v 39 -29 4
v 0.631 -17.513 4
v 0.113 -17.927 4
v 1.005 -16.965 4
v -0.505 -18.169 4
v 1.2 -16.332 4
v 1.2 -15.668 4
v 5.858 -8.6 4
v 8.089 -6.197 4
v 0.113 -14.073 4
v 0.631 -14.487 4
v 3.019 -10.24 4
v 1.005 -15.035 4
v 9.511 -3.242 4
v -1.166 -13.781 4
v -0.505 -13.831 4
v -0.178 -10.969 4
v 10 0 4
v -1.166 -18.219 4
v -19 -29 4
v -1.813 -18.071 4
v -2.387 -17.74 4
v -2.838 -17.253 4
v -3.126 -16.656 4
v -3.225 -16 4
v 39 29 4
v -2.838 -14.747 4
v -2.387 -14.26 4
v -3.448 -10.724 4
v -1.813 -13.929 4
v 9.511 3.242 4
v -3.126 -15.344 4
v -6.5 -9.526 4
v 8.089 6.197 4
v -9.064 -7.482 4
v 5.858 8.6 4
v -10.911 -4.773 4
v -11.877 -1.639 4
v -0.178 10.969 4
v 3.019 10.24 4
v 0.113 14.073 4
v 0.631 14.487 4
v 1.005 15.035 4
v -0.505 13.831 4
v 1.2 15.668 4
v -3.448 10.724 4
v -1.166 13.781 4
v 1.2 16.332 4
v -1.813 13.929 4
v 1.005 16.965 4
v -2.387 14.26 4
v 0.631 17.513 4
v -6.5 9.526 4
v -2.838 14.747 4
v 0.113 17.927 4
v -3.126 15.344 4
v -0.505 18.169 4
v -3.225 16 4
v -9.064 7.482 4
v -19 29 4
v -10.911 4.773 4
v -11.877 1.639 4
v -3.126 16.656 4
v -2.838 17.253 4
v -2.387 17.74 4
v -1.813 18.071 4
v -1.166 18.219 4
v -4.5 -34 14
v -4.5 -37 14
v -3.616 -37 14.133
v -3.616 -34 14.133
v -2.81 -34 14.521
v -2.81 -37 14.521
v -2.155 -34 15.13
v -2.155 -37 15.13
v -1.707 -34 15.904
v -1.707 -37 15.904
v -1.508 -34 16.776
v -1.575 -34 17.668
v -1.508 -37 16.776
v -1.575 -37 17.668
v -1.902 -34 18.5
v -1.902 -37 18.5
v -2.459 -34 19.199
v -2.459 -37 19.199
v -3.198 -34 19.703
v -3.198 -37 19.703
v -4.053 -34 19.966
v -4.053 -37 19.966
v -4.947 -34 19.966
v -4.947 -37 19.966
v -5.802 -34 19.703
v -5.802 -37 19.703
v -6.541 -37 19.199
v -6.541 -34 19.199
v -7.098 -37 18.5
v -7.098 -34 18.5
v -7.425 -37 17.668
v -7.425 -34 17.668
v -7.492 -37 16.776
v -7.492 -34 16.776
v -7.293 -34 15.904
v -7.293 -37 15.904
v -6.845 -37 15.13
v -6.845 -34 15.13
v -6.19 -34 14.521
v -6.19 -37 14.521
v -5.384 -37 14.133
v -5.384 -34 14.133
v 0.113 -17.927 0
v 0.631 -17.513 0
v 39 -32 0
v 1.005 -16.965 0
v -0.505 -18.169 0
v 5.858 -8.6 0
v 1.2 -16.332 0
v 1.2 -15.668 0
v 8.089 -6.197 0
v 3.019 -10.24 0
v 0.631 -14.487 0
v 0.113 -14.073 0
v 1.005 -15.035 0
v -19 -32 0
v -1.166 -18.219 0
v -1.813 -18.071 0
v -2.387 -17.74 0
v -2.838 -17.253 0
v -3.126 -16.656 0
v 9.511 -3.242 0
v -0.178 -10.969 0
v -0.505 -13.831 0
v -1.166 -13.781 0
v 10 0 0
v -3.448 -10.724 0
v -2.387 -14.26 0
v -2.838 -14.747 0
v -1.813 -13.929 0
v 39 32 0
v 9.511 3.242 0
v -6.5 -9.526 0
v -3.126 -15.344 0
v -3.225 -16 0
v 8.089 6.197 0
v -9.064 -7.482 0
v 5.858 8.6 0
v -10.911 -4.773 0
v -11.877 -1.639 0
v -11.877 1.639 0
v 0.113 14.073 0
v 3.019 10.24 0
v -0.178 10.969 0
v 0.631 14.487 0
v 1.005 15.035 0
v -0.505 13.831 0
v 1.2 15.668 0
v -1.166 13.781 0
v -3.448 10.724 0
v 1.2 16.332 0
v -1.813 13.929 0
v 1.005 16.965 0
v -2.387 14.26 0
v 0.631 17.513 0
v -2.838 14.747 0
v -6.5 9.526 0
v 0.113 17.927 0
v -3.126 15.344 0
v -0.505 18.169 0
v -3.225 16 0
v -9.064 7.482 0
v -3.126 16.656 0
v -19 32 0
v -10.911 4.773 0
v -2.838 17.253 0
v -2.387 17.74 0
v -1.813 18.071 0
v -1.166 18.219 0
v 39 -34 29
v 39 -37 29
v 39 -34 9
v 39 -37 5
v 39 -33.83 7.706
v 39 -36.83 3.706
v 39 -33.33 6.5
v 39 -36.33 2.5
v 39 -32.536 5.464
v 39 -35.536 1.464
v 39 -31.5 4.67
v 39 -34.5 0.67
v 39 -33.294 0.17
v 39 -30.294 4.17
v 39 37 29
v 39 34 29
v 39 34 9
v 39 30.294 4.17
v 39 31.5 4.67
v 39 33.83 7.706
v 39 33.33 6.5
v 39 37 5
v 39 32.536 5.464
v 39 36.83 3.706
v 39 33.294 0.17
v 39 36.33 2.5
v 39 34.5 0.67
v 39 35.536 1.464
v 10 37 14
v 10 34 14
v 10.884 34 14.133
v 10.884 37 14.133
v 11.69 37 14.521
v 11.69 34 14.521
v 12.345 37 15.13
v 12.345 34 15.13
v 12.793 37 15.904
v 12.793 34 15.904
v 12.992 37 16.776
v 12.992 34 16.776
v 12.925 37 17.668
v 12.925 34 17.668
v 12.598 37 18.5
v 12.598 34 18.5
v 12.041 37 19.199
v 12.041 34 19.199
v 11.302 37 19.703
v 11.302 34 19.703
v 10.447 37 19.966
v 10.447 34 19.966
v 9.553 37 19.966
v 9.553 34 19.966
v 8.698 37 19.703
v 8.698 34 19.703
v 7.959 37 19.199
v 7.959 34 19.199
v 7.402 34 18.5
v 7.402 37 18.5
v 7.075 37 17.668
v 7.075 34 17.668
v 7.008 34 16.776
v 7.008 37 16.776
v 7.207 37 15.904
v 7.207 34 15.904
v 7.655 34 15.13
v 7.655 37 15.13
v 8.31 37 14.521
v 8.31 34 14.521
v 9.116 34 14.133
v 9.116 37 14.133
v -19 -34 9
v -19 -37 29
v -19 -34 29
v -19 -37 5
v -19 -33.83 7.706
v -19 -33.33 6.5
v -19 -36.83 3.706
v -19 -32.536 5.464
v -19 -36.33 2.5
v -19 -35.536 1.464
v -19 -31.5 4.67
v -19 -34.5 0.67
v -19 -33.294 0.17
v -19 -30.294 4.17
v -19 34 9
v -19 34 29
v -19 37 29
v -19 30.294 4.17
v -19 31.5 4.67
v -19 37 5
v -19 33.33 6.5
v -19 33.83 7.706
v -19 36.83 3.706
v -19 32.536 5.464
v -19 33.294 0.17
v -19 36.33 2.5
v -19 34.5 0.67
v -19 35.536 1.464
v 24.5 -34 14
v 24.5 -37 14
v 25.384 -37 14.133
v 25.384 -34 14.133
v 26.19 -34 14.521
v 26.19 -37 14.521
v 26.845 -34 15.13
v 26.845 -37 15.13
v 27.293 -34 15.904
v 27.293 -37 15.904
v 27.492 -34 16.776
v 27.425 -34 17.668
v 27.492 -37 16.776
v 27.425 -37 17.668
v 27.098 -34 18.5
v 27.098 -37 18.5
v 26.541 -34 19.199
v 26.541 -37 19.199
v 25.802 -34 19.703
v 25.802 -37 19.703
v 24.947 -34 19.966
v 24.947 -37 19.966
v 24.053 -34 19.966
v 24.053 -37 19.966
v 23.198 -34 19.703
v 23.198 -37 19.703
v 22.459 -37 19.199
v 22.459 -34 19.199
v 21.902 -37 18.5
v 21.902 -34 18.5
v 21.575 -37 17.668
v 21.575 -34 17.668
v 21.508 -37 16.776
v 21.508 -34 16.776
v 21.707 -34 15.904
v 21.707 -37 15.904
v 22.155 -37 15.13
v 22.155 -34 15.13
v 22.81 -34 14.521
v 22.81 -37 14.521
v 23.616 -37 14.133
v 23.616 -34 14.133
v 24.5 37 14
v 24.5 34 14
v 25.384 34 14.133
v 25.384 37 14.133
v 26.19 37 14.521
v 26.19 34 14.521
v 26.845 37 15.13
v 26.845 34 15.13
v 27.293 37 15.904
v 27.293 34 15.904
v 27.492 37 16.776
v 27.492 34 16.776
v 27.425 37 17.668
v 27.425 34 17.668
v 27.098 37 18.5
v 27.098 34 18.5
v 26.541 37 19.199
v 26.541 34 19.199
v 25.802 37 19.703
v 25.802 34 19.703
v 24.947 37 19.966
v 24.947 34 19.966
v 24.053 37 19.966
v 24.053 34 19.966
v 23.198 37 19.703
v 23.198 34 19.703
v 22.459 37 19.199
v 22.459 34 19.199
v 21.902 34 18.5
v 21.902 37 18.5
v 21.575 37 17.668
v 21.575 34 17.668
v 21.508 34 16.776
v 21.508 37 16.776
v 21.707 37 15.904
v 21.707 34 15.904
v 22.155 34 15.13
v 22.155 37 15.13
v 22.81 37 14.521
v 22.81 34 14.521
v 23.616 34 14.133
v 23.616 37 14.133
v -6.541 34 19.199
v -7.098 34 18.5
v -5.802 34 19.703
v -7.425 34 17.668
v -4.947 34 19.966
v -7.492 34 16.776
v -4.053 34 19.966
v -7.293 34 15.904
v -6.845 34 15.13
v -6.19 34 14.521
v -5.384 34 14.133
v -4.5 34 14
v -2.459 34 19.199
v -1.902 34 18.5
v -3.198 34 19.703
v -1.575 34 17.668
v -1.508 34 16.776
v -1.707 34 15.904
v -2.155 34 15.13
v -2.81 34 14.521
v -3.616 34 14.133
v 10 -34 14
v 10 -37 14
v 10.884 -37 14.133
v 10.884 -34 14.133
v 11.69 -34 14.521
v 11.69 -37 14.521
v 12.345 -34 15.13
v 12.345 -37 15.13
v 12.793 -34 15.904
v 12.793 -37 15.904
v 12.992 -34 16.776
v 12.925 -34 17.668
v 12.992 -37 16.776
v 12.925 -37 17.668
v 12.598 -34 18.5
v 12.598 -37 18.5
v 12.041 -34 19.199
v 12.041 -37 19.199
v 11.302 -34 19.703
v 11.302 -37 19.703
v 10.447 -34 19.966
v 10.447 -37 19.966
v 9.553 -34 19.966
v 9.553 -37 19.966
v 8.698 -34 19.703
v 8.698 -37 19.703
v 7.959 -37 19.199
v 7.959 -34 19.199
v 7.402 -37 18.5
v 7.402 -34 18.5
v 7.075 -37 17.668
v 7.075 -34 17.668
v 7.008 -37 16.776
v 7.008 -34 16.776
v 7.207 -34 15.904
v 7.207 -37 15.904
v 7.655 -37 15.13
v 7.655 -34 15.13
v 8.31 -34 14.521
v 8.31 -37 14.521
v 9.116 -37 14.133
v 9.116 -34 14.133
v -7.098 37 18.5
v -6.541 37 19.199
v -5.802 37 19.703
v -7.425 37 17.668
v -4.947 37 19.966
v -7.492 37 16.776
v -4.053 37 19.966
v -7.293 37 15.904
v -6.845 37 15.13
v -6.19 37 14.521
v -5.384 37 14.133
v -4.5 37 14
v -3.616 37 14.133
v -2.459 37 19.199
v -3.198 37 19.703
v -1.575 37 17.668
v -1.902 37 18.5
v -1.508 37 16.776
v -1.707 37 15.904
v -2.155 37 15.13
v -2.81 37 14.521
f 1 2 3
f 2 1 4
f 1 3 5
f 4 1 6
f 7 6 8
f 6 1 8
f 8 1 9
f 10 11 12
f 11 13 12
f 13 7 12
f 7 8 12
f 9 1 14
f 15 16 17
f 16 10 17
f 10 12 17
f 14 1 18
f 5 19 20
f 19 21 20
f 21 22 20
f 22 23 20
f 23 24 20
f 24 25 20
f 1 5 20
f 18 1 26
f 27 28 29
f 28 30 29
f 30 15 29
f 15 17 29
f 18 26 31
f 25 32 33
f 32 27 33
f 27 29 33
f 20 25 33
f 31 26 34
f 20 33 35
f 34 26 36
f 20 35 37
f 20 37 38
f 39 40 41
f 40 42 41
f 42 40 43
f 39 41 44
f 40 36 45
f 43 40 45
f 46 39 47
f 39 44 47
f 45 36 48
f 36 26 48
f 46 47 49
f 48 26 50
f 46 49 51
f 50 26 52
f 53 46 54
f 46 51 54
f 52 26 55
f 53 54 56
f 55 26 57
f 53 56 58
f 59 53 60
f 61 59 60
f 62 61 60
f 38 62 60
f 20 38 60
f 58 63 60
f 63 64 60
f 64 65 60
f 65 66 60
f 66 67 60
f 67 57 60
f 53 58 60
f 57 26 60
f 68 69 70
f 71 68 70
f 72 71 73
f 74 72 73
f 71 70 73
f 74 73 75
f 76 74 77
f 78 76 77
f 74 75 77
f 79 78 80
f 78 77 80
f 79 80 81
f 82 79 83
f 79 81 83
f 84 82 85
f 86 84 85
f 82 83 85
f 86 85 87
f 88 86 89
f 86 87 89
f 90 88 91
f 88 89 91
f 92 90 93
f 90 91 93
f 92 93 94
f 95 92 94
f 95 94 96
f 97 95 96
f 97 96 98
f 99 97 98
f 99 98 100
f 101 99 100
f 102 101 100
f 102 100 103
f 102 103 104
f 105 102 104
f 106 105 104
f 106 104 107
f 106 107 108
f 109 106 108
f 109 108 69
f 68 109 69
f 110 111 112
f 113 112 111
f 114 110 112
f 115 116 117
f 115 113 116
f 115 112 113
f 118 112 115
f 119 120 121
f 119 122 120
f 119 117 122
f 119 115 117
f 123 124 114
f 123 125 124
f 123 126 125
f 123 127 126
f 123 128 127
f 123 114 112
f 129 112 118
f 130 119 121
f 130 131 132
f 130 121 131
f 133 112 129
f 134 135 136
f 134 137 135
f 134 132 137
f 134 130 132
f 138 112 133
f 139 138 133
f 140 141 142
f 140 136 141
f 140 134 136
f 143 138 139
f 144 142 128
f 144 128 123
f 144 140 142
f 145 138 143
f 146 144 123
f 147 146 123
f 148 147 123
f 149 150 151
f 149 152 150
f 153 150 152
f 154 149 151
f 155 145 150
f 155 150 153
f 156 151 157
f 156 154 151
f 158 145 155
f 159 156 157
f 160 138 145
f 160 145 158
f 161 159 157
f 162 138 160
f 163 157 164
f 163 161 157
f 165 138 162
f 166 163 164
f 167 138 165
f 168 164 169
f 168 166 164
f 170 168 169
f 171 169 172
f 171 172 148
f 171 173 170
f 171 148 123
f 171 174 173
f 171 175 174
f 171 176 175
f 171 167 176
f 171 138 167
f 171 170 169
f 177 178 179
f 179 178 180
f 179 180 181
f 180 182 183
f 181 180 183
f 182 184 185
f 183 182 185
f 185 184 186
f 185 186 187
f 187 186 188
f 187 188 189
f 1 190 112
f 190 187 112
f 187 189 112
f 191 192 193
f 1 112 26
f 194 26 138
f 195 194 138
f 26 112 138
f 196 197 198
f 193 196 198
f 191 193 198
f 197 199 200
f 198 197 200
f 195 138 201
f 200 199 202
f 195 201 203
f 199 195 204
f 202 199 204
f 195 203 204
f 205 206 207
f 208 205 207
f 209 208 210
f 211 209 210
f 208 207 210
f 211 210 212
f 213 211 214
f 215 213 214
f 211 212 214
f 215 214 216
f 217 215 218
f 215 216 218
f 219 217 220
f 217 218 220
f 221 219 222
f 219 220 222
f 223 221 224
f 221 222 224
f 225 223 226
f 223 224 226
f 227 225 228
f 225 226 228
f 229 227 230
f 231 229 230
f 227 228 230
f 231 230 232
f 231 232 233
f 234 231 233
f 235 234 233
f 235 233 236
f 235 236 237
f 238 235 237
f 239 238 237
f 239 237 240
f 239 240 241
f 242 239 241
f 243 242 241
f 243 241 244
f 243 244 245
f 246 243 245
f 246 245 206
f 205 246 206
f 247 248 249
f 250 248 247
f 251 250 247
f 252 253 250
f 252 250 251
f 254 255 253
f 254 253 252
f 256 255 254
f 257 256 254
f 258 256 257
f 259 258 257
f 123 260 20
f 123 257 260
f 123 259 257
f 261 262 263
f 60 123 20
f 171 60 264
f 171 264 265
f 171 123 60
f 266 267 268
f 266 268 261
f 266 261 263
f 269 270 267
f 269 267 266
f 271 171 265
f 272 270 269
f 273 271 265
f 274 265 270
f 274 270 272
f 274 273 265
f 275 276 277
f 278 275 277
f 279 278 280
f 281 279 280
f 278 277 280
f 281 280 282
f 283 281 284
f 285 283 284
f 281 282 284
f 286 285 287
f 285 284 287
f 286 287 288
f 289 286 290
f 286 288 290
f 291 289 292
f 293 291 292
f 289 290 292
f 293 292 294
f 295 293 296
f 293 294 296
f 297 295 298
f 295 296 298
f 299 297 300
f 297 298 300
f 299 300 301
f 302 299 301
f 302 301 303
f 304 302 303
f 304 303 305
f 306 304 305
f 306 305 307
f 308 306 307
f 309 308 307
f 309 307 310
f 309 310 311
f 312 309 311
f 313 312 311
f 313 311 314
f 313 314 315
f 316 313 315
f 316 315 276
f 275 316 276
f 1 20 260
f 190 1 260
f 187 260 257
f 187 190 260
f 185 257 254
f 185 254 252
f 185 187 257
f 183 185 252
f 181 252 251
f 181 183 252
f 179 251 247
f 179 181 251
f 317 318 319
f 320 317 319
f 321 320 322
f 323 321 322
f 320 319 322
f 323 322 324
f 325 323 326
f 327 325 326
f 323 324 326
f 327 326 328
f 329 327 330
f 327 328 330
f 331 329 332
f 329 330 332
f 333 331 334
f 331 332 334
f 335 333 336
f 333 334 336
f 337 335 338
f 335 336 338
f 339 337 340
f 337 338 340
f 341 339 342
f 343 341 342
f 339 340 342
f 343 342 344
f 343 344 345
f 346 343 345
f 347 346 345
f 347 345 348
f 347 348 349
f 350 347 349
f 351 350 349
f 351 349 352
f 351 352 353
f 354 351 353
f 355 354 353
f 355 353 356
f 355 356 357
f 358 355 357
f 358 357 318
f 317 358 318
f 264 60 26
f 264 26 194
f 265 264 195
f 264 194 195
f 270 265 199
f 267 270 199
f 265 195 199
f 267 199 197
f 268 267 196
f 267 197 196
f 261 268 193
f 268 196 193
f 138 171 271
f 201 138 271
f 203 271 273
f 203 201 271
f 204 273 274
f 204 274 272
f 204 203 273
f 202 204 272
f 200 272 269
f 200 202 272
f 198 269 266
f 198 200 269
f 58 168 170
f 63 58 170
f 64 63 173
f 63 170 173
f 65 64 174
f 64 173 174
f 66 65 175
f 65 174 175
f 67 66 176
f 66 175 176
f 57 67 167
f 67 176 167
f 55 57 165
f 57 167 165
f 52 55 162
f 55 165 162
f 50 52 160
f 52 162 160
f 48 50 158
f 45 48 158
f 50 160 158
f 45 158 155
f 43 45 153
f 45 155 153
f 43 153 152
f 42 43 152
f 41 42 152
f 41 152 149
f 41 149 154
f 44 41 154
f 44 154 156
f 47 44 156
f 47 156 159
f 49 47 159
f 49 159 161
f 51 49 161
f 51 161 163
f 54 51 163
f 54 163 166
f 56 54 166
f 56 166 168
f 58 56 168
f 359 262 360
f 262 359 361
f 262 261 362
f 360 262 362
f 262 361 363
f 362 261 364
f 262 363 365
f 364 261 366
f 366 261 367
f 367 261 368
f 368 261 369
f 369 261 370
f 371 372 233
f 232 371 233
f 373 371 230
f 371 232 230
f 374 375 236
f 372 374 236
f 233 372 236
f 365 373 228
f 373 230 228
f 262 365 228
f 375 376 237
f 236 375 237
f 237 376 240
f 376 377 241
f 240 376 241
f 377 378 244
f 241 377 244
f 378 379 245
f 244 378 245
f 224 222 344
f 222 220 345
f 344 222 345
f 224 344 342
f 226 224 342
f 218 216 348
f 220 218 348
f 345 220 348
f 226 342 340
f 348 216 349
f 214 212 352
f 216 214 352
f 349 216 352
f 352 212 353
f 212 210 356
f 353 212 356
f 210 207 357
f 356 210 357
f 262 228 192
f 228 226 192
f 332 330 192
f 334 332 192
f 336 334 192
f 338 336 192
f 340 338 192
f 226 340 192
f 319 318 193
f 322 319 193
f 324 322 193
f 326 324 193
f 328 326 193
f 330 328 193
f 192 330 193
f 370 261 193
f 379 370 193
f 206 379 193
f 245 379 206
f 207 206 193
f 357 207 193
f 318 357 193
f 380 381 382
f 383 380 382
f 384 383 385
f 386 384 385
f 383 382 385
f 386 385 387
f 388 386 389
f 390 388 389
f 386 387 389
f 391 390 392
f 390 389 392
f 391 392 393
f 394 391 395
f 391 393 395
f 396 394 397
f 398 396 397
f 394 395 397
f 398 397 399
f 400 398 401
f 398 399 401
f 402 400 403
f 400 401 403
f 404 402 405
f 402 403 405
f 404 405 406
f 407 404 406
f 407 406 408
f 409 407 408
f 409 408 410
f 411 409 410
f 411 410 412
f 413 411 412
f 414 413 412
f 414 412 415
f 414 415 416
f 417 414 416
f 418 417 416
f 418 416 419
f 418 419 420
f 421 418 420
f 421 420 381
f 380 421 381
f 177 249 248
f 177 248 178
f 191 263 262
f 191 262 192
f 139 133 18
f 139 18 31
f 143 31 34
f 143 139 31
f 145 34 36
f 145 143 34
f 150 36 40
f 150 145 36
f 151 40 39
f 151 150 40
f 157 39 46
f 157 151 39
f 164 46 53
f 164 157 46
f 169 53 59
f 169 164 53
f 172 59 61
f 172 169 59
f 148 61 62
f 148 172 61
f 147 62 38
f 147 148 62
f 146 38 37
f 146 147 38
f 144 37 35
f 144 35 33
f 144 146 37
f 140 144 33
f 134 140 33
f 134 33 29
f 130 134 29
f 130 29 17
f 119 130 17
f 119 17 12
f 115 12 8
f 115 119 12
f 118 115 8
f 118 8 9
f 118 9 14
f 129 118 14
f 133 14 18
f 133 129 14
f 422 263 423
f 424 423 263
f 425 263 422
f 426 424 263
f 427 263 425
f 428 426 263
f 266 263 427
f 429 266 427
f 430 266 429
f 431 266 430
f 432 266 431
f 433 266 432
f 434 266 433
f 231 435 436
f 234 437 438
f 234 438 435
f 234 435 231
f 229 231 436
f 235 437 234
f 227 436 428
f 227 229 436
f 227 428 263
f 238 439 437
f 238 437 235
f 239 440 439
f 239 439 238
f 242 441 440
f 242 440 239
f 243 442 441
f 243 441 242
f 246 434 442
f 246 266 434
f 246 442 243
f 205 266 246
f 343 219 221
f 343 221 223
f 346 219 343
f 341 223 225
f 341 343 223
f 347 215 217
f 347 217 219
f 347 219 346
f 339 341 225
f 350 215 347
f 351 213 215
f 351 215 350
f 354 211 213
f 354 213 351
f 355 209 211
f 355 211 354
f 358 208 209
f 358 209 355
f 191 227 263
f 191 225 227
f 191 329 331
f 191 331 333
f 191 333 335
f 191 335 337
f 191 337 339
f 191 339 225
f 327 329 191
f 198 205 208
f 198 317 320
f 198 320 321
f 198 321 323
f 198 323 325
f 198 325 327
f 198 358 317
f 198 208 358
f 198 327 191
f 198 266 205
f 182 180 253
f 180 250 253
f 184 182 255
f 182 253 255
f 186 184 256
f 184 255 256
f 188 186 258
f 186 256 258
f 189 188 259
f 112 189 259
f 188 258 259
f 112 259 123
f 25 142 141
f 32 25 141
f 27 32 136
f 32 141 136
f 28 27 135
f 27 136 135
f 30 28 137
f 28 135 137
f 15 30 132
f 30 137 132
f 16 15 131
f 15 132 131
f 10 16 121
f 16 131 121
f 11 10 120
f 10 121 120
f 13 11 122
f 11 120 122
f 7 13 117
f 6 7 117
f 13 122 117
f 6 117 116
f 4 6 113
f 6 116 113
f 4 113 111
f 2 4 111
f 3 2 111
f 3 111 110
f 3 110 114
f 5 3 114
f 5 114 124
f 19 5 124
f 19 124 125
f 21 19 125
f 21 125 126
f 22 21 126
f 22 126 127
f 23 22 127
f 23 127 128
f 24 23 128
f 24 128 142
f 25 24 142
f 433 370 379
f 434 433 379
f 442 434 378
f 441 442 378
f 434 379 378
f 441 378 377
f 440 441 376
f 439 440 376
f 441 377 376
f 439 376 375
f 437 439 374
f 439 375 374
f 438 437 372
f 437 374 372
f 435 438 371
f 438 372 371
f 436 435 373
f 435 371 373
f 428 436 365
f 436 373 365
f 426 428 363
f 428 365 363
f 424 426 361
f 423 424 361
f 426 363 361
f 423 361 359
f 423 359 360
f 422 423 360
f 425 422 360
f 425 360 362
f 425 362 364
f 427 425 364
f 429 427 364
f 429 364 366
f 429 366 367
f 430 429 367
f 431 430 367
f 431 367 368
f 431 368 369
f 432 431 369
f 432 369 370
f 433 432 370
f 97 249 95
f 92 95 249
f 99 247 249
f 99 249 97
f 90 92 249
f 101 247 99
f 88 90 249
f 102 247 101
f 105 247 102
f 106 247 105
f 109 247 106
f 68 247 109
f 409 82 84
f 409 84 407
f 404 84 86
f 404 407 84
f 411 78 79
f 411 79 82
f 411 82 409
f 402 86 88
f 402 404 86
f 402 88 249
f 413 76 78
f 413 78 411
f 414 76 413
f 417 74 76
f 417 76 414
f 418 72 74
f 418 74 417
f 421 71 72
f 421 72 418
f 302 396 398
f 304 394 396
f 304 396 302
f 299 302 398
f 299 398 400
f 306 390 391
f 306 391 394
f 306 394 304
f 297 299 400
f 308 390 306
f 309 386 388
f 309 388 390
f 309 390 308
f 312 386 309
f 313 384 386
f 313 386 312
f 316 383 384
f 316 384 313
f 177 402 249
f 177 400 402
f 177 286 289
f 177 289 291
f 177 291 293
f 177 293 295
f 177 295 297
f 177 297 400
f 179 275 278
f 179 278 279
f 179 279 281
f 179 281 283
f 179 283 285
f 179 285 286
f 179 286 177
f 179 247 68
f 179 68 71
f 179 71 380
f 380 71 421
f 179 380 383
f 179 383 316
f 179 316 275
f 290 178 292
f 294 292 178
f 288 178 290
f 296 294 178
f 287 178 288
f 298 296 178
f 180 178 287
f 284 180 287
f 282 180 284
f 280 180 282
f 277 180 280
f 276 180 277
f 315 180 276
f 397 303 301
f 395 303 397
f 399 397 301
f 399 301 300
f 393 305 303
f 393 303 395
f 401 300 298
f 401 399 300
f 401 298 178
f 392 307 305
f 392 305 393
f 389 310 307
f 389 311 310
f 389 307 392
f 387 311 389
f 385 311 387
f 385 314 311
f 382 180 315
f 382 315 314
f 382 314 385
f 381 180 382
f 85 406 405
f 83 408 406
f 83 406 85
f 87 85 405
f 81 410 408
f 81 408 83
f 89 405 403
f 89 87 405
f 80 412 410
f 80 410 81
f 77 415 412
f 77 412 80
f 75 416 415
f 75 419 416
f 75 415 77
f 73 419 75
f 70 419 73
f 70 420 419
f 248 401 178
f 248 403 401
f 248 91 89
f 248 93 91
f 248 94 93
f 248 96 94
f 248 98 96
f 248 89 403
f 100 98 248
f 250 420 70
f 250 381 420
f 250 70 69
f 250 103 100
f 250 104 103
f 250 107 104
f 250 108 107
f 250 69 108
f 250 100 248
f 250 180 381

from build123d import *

# Parameters (mm, degrees)
SKETCH3_R           = 11
BOSS_EXTRUDE1_DEPTH = 4
SKETCH5_W           = 58
SKETCH5_H           = 3
BOSS_EXTRUDE2_DEPTH = 25
FILLET1_R           = 5
SKETCH6_R           = 3
CUT_EXTRUDE1_DEPTH  = 89.532479916
SKETCH7_R           = 2.225
CUT_EXTRUDE2_DEPTH  = 62.081912216


with BuildPart() as part:
    # Sketch3 → Boss-Extrude1 (new body)
    with BuildSketch(Plane.XY):
        Polygon((-19, 37), (39, 37), (39, 0), (39, -37), (-19, -37), (-19, 0), align=None)
        with Locations((-1, 0)):
            Circle(SKETCH3_R, mode=Mode.SUBTRACT)
    extrude(amount=BOSS_EXTRUDE1_DEPTH)

    # Sketch5 → Boss-Extrude2 (add)
    with BuildSketch(Plane.XY.offset(4)):
        with Locations((10, 35.5)):
            Rectangle(SKETCH5_W, SKETCH5_H)
        with Locations((10, -35.5)):
            Rectangle(SKETCH5_W, SKETCH5_H)
    extrude(amount=BOSS_EXTRUDE2_DEPTH)

    # Fillet1
    fillet1_edges = [part.edges().sort_by_distance(p)[0] for p in [
        (10, 34, 4),
        (10, -34, 4),
        (10, -37, 0),
        (10, 37, 0),
    ]]
    fillet(fillet1_edges, radius=FILLET1_R)

    # Sketch6 → Cut-Extrude1 (cut, through all)
    with BuildSketch(Plane.XZ.offset(37)):
        with Locations(Location((24.5, 17, 0), (0, 0, 270))):
            Circle(SKETCH6_R)
        with Locations(Location((-4.5, 17, 0), (0, 0, 270))):
            Circle(SKETCH6_R)
        with Locations(Location((10, 17, 0), (0, 0, 270))):
            Circle(SKETCH6_R)
    extrude(amount=-CUT_EXTRUDE1_DEPTH, mode=Mode.SUBTRACT)

    # Sketch7 → Cut-Extrude2 (cut, through all)
    with BuildSketch(Plane(origin=(0, 0, 0), x_dir=(-1, 0, 0), z_dir=(0, 0, -1))):
        with Locations((1, -16)):
            Circle(SKETCH7_R)
        with Locations((1, 16)):
            Circle(SKETCH7_R)
    extrude(amount=-CUT_EXTRUDE2_DEPTH, mode=Mode.SUBTRACT)


solid = part.part
